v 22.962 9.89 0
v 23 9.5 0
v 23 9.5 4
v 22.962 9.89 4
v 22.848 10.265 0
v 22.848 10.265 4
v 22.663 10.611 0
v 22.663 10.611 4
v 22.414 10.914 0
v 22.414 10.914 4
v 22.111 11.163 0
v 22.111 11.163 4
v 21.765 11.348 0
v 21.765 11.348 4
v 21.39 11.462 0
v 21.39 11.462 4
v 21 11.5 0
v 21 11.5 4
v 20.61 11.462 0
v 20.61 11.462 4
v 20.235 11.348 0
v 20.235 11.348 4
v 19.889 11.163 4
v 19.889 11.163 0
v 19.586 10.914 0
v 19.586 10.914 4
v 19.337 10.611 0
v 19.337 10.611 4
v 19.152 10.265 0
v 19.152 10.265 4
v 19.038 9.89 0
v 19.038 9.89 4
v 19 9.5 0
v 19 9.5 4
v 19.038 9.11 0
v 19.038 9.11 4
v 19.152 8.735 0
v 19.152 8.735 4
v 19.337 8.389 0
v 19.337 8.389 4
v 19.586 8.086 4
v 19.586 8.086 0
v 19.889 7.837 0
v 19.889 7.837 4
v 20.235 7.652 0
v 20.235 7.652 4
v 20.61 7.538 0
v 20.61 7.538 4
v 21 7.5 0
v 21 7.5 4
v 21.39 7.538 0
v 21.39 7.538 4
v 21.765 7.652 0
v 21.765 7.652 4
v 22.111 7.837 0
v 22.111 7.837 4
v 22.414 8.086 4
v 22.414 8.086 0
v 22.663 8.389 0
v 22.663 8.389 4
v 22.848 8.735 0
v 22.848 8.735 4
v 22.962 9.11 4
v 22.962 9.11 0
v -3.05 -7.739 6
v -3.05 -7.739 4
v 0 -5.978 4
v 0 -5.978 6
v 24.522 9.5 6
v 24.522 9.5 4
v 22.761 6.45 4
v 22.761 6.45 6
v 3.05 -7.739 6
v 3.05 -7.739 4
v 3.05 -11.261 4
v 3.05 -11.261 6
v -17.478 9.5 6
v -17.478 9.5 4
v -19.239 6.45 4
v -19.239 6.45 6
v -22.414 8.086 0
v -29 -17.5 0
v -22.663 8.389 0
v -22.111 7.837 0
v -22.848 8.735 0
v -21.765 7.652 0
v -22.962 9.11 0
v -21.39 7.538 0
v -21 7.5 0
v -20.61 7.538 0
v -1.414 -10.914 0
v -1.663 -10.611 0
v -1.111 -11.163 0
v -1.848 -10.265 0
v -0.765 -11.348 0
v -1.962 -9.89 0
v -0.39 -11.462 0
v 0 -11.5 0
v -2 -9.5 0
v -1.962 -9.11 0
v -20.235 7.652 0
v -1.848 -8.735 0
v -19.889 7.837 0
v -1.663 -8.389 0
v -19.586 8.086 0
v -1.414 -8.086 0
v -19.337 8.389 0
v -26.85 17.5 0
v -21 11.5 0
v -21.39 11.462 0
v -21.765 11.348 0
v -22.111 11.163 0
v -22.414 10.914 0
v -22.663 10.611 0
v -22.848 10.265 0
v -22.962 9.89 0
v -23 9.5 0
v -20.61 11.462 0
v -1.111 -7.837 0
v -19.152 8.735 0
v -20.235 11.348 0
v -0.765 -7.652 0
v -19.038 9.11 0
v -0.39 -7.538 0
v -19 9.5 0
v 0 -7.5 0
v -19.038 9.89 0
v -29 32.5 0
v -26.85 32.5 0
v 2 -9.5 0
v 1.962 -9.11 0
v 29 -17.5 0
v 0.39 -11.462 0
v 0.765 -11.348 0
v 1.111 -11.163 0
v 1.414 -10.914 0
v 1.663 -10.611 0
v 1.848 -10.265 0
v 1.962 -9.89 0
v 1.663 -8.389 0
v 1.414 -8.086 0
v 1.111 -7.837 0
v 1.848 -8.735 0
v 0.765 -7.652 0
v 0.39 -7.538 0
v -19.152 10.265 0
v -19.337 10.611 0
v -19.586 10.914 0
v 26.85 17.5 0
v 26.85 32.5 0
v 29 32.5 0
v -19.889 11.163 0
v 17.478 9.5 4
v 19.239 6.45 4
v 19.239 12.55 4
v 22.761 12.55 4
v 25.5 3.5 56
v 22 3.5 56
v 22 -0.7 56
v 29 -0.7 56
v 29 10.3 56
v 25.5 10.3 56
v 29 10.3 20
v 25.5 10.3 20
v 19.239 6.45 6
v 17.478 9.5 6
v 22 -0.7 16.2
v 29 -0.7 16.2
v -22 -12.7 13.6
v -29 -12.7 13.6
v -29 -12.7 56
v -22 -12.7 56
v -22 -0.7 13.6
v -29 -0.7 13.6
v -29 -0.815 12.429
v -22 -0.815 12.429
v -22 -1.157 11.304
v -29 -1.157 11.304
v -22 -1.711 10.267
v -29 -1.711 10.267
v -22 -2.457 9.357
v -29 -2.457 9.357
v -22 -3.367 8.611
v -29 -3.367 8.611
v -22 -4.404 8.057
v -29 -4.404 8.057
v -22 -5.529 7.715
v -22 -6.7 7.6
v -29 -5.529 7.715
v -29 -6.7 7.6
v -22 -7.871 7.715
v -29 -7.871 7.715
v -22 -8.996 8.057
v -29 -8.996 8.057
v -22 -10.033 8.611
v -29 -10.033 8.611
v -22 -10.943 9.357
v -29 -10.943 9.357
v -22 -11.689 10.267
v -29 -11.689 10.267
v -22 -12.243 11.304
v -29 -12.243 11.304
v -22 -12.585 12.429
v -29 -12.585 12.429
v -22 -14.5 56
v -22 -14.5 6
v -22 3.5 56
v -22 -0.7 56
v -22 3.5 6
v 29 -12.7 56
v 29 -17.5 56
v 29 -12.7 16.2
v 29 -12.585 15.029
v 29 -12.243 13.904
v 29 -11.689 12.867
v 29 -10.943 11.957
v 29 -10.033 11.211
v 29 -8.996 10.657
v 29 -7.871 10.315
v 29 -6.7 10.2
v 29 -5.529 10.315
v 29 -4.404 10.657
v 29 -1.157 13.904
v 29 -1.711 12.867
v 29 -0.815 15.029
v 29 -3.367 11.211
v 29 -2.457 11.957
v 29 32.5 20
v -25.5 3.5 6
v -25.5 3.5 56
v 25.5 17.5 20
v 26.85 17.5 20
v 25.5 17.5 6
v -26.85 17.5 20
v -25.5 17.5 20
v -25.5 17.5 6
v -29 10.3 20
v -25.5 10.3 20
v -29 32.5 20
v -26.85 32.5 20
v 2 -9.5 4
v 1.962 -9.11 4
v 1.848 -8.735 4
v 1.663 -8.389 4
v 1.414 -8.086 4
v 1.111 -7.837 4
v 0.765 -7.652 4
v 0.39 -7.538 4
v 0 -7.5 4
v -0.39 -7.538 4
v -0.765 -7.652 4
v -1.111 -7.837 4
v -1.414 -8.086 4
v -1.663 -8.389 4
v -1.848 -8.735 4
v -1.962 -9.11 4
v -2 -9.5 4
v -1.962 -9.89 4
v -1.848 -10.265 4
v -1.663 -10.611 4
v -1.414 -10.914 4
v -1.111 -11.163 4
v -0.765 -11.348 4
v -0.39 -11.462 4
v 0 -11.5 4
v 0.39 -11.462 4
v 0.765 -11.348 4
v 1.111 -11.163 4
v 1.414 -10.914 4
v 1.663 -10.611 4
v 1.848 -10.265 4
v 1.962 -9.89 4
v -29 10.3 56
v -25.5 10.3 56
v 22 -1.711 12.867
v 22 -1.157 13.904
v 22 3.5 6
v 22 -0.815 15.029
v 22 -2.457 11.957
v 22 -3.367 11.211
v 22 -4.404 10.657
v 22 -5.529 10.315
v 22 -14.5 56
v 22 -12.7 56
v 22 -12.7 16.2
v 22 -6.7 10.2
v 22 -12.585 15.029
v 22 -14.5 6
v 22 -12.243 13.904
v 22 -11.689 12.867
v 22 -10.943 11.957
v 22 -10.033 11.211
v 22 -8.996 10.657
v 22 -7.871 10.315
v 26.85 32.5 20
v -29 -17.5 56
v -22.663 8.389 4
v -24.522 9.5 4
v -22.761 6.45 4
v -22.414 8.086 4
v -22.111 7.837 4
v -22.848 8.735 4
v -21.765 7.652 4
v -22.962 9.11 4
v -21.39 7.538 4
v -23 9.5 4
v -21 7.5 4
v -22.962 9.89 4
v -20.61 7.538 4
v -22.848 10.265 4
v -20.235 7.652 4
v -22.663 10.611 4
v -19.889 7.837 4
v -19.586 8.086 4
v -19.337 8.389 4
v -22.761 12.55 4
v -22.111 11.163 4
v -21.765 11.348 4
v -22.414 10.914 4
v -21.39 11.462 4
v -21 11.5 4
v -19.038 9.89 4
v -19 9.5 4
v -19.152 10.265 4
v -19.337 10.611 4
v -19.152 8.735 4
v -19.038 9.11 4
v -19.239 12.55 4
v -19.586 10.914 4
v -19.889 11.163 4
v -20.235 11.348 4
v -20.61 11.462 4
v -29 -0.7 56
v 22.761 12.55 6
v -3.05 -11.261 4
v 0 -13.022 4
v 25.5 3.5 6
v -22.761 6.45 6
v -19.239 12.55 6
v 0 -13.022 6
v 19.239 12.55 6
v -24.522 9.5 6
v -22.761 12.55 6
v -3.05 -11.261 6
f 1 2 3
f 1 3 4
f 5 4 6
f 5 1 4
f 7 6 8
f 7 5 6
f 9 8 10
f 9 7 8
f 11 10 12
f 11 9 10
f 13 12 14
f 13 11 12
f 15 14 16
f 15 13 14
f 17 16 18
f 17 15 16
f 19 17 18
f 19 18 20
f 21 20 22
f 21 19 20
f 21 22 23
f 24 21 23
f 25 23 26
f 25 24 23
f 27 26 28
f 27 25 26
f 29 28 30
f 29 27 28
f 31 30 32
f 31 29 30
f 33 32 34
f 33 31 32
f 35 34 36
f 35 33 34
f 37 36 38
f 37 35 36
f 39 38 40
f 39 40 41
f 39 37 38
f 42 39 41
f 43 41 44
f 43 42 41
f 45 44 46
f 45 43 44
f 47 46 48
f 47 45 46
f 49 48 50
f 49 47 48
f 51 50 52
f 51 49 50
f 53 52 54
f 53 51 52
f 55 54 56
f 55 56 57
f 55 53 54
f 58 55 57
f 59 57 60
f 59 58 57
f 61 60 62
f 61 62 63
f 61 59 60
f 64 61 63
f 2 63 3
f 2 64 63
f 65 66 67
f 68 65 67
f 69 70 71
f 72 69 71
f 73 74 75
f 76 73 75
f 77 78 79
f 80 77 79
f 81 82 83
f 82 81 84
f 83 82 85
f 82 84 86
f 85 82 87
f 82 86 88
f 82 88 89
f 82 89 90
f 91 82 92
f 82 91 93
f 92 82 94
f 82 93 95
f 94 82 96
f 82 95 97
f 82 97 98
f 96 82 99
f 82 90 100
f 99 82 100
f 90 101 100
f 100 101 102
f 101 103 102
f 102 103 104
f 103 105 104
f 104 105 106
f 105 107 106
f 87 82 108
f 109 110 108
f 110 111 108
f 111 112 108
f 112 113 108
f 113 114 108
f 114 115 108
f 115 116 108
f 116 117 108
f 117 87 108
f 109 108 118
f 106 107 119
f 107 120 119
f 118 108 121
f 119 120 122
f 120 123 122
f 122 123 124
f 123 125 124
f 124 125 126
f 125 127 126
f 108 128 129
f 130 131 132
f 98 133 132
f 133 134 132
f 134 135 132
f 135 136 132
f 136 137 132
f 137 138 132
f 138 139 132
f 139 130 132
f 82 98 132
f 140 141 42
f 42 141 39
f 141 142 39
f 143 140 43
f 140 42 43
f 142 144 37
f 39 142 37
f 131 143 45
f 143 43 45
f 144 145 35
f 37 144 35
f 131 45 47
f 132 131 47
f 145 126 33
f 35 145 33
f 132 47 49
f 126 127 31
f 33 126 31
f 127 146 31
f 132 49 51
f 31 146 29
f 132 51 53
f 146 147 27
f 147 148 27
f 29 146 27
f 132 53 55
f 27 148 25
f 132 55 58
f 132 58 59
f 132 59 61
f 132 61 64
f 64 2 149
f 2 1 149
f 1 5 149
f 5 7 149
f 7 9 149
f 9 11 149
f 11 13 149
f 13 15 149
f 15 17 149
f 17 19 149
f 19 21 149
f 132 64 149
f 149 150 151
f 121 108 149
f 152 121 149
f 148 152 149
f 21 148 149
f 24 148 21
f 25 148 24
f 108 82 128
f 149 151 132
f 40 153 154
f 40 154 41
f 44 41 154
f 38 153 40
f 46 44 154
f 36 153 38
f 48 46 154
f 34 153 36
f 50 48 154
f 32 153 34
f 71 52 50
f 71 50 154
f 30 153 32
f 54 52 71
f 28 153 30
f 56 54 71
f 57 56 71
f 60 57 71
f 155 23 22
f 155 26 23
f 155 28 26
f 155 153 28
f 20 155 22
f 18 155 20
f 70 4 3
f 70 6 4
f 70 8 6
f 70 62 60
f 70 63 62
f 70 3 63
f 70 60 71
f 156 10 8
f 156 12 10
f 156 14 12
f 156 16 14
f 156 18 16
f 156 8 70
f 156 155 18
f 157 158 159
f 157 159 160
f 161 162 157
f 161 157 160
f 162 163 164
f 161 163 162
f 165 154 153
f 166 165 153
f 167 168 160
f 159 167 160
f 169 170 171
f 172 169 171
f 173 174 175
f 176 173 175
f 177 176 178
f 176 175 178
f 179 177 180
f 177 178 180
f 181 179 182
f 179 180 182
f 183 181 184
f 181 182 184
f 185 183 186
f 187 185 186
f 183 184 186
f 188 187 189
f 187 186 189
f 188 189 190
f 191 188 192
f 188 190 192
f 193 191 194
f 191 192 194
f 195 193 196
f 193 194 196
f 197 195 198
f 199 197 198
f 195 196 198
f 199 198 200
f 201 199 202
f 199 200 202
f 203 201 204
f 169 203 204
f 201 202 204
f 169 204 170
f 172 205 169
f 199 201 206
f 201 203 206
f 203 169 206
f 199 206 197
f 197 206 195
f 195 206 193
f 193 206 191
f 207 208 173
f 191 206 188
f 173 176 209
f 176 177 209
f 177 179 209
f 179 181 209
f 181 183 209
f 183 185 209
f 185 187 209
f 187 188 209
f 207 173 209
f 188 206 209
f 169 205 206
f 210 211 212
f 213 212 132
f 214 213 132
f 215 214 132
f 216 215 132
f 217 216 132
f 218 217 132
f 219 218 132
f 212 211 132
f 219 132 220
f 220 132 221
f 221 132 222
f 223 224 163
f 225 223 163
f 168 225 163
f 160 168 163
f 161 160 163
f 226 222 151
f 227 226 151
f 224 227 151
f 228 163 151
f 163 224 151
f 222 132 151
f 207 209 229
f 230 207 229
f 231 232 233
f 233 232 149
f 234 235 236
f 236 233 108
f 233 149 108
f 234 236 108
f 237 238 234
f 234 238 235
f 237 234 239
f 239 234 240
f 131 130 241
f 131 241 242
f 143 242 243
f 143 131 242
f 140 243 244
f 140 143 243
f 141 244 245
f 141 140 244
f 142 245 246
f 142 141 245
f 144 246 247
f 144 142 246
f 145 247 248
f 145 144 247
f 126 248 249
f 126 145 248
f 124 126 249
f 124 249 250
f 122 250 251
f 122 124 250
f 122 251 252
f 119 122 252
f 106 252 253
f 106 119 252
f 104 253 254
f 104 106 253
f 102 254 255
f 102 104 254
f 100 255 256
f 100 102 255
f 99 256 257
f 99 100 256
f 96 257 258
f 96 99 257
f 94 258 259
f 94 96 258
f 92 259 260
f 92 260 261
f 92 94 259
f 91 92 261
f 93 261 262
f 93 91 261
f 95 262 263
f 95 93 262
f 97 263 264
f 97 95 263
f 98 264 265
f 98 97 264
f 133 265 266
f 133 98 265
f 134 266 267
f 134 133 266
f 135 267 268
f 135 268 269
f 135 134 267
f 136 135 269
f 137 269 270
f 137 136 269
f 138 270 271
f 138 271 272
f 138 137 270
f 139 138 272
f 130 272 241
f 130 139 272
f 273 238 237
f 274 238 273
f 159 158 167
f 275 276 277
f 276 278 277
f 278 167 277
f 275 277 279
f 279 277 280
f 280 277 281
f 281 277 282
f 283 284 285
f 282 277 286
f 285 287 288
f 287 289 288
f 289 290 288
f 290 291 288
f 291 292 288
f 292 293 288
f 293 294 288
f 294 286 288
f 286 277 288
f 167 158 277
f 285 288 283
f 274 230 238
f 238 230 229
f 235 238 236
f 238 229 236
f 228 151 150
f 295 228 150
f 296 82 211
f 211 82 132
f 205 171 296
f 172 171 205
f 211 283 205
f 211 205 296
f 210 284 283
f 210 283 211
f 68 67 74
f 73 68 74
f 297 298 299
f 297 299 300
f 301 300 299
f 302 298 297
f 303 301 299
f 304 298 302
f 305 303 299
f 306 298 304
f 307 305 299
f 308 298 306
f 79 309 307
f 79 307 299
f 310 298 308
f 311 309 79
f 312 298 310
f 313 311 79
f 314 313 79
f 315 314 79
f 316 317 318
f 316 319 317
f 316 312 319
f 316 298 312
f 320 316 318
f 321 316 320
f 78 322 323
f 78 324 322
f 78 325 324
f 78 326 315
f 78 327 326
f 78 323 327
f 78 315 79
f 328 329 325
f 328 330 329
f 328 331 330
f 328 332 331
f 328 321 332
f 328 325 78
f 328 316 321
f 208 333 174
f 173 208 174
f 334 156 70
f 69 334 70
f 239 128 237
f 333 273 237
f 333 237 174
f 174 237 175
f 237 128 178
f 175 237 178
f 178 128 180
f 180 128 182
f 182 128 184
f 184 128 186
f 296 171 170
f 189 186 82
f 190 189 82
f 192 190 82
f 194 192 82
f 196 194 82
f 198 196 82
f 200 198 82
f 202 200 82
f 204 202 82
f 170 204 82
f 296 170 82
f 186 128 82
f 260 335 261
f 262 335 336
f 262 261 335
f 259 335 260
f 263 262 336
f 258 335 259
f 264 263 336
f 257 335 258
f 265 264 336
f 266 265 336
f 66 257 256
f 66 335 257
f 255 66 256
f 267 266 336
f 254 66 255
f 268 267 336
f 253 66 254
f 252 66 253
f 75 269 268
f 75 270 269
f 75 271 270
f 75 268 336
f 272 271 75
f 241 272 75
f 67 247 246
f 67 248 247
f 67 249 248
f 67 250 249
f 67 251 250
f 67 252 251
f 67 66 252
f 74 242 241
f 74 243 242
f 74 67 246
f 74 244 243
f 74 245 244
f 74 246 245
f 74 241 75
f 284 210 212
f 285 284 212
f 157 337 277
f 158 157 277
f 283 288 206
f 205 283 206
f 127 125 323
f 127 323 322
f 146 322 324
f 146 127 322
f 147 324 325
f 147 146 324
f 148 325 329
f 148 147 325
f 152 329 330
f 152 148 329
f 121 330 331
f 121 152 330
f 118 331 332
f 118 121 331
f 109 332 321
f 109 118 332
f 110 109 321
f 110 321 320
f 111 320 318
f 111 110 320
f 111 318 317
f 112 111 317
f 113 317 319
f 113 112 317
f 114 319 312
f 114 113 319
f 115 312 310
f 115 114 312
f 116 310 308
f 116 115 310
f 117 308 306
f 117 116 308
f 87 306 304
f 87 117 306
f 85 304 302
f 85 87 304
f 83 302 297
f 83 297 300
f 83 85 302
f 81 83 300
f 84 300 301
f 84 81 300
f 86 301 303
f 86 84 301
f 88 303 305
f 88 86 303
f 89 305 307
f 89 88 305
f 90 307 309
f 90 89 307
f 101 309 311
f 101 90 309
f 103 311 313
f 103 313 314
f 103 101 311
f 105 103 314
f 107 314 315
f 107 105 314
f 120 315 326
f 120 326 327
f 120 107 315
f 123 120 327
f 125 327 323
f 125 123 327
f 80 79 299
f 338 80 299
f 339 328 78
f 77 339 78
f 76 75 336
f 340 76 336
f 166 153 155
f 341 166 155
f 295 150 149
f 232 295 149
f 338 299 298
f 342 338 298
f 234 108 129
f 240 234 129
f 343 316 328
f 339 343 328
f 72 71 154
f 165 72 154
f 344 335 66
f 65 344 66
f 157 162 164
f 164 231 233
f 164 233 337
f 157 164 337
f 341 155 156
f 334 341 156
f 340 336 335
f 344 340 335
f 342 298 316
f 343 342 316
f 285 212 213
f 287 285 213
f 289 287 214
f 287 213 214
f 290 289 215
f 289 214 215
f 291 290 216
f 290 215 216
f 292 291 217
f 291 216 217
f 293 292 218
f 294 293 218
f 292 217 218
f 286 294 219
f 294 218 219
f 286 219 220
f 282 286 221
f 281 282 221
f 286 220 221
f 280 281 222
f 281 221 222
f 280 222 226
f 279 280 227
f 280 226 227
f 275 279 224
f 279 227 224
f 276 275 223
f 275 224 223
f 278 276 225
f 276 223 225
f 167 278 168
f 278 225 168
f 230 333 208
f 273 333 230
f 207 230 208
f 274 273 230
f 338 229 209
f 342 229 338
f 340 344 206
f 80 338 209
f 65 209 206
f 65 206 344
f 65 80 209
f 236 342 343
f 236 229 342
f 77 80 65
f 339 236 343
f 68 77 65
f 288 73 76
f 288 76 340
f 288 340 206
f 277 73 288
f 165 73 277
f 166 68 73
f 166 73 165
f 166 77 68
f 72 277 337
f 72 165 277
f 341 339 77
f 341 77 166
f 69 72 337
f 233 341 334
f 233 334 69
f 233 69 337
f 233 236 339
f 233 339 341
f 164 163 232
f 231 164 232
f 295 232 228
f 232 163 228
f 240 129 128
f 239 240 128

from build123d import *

# Parameters (mm, degrees)
F0_R      = 2
F1_DEPTH  = 4
F3_DEPTH  = 2
F5_DEPTH  = 50
F7_DEPTH  = 8
F9_DEPTH  = 8
F10_W     = 22.2
F10_H     = 36
F11_DEPTH = 60


with BuildPart() as f1:
    # F0 (on Top) → F1 (new body)
    with BuildSketch(Plane.XY):
        Polygon((26.85, 17.5), (-26.85, 17.5), (-26.85, 32.5), (-29, 32.5), (-29, 17.5), (-29, -17.5), (29, -17.5), (29, 17.5), (29, 32.5), (26.85, 32.5), align=None)
        with Locations((0, -9.5)):
            Circle(F0_R, mode=Mode.SUBTRACT)
        with Locations((-21, 9.5)):
            Circle(F0_R, mode=Mode.SUBTRACT)
        with Locations((21, 9.5)):
            Circle(F0_R, mode=Mode.SUBTRACT)
    extrude(amount=F1_DEPTH)

    # F2 (on face) → F3 (join)
    with BuildSketch(Plane.XY.offset(4)):
        Polygon((26.85, 32.5), (26.85, 17.5), (-26.85, 17.5), (-26.85, 32.5), (-29, 32.5), (-29, -17.5), (29, -17.5), (29, 32.5), align=None)
        Polygon((3.05, -11.260918321), (0, -13.0218366421), (-3.05, -11.260918321), (-3.05, -7.739081679), (0, -5.9781633579), (3.05, -7.739081679), align=None, mode=Mode.SUBTRACT)
        Polygon((-17.4781633579, 9.5), (-19.239081679, 6.45), (-22.760918321, 6.45), (-24.5218366421, 9.5), (-22.760918321, 12.55), (-19.239081679, 12.55), align=None, mode=Mode.SUBTRACT)
        Polygon((22.760918321, 12.55), (24.5218366421, 9.5), (22.760918321, 6.45), (19.239081679, 6.45), (17.4781633579, 9.5), (19.239081679, 12.55), align=None, mode=Mode.SUBTRACT)
    extrude(amount=F3_DEPTH)

    # F4 (on face) → F5 (join)
    with BuildSketch(Plane.XY.offset(6)):
        Polygon((-25.5, 3.5), (-25.5, 17.5), (-26.85, 17.5), (-26.85, 32.5), (-29, 32.5), (-29, -17.5), (29, -17.5), (29, 32.5), (26.85, 32.5), (26.85, 17.5), (25.5, 17.5), (25.5, 3.5), (22, 3.5), (22, -14.5), (-22, -14.5), (-22, 3.5), align=None)
    extrude(amount=F5_DEPTH)

    # F6 (on face) → F7 (cut)
    with BuildSketch(Plane(origin=(-29, 0, 0), x_dir=(0, -1, 0), z_dir=(-1, 0, 0))):
        with BuildLine():
            Line((0.7, 56), (0.7, 13.6))
            ThreePointArc((0.7, 13.6), (6.7, 7.6), (12.7, 13.6))
            Line((12.7, 13.6), (12.7, 56))
            Line((12.7, 56), (0.7, 56))
        make_face()
    extrude(amount=-F7_DEPTH, mode=Mode.SUBTRACT)

    # F8 (on face) → F9 (cut)
    with BuildSketch(Plane.YZ.offset(29)):
        with BuildLine():
            Line((-12.7, 56), (-12.7, 16.2))
            ThreePointArc((-12.7, 16.2), (-6.7, 10.2), (-0.7, 16.2))
            Line((-0.7, 16.2), (-0.7, 56))
            Line((-0.7, 56), (-12.7, 56))
        make_face()
    extrude(amount=-F9_DEPTH, mode=Mode.SUBTRACT)

    # F10 (on face) → F11 (cut)
    with BuildSketch(Plane.YZ.offset(29)):
        with Locations((21.4, 38)):
            Rectangle(F10_W, F10_H)
    extrude(amount=-F11_DEPTH, mode=Mode.SUBTRACT)


solid = f1.part
